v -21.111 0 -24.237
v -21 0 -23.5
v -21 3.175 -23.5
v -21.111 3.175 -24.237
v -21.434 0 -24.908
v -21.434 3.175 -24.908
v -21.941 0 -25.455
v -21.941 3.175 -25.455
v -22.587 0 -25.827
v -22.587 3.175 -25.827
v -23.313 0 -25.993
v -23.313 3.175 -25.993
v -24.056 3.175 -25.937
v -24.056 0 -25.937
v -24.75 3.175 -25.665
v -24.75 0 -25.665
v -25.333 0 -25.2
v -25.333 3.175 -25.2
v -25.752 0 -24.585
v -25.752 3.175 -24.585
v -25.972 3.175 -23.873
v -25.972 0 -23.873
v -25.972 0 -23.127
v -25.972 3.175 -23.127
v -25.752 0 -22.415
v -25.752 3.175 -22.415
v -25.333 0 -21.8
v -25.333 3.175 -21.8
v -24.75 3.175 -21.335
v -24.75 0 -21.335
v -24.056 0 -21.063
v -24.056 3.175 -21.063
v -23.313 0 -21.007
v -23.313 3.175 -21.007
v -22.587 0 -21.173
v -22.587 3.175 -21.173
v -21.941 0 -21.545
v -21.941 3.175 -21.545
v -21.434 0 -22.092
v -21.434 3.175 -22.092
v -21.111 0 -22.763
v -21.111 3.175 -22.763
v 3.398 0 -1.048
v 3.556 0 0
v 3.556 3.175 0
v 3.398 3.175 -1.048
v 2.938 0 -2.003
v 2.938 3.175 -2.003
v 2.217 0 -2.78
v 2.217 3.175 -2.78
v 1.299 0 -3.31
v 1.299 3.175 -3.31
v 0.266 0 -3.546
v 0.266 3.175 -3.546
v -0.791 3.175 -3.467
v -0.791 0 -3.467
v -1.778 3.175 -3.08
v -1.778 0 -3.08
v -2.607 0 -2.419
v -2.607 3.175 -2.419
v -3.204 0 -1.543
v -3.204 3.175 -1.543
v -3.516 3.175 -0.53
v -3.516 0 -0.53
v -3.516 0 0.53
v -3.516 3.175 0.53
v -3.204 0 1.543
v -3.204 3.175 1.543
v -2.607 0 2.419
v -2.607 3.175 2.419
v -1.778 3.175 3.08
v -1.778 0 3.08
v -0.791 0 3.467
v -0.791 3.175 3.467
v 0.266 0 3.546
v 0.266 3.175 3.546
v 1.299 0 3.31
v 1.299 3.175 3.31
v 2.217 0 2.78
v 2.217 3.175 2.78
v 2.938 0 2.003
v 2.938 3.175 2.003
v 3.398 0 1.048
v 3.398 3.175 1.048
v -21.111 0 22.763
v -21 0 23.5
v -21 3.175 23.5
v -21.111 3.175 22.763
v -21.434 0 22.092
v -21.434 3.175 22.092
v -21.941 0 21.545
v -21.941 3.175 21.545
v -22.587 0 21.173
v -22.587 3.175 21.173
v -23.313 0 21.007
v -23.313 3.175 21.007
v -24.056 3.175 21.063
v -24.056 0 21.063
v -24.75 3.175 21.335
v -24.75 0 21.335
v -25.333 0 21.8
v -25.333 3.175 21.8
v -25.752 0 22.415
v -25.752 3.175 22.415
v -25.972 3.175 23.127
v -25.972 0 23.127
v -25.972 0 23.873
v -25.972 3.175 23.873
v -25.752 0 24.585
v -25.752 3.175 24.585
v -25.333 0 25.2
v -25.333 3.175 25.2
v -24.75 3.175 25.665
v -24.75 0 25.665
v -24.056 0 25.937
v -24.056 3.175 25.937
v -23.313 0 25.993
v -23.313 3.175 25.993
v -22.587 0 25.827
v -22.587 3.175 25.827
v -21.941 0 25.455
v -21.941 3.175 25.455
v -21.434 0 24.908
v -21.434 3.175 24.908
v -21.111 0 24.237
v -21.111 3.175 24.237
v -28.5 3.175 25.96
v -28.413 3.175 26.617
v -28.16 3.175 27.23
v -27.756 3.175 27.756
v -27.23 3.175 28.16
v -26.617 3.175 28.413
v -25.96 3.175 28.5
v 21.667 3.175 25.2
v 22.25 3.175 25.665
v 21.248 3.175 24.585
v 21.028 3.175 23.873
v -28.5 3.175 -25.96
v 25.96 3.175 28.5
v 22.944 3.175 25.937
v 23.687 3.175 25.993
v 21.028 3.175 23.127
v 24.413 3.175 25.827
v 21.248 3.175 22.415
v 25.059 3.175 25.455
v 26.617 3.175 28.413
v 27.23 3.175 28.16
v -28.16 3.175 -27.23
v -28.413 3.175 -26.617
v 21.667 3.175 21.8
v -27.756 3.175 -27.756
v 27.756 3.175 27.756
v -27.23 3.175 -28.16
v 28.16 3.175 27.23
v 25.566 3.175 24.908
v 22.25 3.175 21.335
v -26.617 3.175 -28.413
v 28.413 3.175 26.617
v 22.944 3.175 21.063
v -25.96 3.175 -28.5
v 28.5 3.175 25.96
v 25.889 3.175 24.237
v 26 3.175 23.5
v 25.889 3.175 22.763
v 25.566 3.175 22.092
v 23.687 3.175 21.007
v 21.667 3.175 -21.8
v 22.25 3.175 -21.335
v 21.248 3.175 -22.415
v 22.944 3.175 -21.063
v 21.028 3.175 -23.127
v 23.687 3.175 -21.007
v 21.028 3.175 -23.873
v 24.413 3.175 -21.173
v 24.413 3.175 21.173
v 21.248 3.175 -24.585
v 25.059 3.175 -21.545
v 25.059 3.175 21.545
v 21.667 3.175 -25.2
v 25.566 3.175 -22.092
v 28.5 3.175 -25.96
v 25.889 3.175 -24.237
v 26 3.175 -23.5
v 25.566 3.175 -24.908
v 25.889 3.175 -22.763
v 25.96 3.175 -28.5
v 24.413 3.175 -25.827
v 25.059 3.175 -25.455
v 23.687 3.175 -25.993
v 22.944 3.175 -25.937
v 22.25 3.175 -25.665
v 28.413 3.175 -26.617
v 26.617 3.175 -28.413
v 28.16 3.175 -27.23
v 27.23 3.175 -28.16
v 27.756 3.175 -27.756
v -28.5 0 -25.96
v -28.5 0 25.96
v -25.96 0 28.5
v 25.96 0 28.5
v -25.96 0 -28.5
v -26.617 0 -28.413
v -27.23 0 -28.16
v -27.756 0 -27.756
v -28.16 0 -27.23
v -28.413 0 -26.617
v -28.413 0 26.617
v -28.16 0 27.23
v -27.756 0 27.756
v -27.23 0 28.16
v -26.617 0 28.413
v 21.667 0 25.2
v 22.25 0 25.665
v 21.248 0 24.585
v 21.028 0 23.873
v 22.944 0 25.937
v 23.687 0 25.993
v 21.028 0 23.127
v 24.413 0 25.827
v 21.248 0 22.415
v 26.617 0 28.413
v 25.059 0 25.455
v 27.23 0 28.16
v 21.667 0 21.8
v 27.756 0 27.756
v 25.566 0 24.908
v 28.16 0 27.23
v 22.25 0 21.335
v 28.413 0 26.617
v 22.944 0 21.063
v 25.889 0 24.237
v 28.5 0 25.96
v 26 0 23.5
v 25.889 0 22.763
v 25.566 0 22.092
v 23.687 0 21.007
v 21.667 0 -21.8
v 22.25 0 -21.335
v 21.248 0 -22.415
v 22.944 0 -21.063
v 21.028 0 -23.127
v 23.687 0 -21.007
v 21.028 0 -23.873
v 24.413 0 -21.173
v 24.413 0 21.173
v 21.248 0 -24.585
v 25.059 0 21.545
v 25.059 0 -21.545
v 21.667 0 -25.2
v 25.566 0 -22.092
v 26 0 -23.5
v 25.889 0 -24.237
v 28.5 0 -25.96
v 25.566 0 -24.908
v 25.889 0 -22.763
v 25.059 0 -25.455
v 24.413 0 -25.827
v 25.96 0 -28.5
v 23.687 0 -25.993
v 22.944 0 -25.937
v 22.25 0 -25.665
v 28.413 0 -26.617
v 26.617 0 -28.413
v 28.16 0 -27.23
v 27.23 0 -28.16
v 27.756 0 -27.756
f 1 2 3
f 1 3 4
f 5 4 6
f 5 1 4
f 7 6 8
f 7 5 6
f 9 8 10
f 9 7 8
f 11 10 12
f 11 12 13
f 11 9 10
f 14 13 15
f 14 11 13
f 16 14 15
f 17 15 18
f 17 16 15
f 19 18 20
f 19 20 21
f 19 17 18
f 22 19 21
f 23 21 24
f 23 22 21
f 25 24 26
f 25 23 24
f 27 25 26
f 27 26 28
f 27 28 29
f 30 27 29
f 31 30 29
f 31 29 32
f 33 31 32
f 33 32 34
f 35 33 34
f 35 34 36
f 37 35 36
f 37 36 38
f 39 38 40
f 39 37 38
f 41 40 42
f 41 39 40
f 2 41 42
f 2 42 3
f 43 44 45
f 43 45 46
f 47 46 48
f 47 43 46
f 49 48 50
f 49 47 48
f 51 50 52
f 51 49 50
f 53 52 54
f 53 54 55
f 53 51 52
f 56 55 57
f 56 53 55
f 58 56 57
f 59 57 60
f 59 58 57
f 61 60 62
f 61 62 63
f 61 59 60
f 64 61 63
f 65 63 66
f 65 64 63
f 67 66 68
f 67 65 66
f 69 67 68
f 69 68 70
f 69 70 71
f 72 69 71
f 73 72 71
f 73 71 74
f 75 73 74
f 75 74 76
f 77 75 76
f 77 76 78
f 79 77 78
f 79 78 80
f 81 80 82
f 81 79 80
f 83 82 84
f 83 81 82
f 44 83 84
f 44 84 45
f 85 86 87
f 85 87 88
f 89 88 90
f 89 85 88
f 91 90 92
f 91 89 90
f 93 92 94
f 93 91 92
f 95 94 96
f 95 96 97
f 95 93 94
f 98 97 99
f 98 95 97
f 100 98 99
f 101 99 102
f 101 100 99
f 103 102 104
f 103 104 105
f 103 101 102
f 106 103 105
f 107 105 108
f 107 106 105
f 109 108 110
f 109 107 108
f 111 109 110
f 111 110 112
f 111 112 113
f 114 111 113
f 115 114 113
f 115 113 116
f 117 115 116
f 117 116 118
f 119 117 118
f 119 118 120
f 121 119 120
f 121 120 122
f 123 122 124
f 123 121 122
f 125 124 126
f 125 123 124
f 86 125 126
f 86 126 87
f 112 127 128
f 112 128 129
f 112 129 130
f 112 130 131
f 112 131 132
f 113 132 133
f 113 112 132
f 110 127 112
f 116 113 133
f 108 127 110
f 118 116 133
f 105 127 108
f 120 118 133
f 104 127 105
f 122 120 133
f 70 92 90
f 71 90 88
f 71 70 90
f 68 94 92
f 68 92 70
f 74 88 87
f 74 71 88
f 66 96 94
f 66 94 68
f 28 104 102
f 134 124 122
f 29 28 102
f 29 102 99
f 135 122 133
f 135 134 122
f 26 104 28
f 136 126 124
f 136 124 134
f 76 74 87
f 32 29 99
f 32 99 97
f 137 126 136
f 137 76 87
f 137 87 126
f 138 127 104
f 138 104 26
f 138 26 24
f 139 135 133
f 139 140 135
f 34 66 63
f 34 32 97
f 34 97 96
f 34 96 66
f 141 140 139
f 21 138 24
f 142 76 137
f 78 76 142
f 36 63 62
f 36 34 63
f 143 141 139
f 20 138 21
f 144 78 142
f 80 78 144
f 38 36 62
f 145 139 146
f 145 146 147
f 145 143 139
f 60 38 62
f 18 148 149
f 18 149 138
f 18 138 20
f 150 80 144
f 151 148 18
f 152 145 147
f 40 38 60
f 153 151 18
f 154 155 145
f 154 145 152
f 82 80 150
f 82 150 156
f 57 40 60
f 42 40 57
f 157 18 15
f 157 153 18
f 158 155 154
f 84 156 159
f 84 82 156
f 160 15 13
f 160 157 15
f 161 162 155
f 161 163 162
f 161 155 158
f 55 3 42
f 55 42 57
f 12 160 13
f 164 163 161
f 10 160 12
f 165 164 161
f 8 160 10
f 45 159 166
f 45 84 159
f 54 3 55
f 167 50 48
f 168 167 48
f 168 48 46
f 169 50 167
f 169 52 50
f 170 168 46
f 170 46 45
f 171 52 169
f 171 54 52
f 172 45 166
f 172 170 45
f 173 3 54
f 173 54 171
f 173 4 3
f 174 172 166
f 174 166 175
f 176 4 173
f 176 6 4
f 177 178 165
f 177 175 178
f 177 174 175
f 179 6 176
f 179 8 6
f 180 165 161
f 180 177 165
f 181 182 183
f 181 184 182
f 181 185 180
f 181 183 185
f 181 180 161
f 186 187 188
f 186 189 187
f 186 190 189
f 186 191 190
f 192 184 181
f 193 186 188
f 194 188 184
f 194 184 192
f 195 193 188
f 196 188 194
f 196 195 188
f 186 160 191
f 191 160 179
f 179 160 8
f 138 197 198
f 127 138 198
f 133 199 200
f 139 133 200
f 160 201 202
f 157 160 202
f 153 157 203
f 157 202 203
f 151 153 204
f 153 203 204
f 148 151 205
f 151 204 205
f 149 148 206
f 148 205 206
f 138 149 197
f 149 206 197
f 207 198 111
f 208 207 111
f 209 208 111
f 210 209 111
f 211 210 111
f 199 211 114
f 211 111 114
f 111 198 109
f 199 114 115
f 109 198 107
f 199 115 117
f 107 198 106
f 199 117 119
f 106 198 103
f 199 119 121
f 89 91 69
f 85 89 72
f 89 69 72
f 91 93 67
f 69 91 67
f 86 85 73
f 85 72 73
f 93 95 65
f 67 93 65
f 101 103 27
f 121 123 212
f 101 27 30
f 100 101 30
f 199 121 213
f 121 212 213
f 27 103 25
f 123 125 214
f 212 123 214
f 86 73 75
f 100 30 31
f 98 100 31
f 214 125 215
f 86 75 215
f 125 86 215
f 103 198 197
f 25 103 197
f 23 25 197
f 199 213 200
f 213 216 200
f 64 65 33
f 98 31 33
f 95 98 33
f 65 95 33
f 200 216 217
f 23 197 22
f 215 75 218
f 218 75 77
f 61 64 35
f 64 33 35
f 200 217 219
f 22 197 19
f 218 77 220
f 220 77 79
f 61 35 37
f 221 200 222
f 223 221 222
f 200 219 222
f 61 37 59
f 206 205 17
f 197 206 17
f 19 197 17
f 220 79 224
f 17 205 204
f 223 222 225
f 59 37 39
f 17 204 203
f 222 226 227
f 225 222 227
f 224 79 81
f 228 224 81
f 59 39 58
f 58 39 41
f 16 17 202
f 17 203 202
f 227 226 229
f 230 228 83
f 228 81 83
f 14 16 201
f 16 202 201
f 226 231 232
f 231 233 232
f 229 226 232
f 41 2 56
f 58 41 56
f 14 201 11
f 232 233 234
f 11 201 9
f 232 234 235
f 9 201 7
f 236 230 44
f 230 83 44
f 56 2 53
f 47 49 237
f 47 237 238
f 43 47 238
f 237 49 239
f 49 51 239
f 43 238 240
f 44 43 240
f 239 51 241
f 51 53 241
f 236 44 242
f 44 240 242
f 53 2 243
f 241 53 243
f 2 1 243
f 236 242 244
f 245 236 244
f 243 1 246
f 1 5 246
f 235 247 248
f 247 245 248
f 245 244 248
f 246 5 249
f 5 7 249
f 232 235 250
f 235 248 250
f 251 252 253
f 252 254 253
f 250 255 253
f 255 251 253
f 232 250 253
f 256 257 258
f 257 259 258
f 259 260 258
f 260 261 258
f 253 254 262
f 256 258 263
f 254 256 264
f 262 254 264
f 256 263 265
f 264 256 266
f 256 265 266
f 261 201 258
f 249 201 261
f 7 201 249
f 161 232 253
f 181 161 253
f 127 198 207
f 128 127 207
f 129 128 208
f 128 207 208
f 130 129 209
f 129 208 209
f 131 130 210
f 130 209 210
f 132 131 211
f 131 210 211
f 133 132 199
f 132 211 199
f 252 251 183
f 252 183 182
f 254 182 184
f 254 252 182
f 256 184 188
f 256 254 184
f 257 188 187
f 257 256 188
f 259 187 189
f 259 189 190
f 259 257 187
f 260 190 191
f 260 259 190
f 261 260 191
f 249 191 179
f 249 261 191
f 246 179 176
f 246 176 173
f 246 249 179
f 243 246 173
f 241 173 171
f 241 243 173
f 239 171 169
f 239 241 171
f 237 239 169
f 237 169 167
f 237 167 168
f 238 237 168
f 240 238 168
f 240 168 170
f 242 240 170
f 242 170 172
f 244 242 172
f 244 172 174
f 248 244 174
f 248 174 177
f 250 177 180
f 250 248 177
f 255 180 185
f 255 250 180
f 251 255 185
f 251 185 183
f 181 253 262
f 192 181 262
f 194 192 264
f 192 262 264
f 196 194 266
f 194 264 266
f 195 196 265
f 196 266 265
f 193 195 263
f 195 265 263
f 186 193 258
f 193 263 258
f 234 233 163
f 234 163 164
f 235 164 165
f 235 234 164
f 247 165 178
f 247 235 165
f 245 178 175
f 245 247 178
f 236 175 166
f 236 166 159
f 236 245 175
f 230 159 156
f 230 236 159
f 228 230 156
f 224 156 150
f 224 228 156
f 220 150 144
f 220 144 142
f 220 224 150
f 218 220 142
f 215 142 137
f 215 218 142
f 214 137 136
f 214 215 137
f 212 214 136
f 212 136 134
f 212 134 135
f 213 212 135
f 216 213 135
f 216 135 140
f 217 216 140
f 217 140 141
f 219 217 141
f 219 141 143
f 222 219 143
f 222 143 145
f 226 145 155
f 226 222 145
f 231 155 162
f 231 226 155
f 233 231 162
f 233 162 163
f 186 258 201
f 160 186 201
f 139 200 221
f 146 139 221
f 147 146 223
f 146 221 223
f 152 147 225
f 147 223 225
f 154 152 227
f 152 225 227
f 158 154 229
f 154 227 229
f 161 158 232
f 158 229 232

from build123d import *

# Parameters (mm, degrees)
SKETCH1_R           = 3.556
SKETCH1_R_2         = 2.499995
BOSS_EXTRUDE1_DEPTH = 3.175


with BuildPart() as part:
    # Sketch1 → Boss-Extrude1 (new body)
    with BuildSketch(Plane(origin=(0, 0, 0), x_dir=(1, 0, 0), z_dir=(0, 1, 0))):
        with BuildLine():
            Line((-13.993314597, 28.4999938), (-25.9599938, 28.4999938))
            ThreePointArc((-25.9599938, 28.4999938), (-27.756045024, 27.756045024), (-28.4999938, 25.9599938))
            Line((-28.4999938, 25.9599938), (-28.4999938, 13.993314597))
            Line((-28.4999938, 13.993314597), (-28.4999938, -13.993314597))
            Line((-28.4999938, -13.993314597), (-28.4999938, -25.9599938))
            ThreePointArc((-28.4999938, -25.9599938), (-27.756045024, -27.756045024), (-25.9599938, -28.4999938))
            Line((-25.9599938, -28.4999938), (-13.993314597, -28.4999938))
            Line((-13.993314597, -28.4999938), (13.993314597, -28.4999938))
            Line((13.993314597, -28.4999938), (25.9599938, -28.4999938))
            ThreePointArc((25.9599938, -28.4999938), (27.756045024, -27.756045024), (28.4999938, -25.9599938))
            Line((28.4999938, -25.9599938), (28.4999938, -13.993314597))
            Line((28.4999938, -13.993314597), (28.4999938, 13.993314597))
            Line((28.4999938, 13.993314597), (28.4999938, 25.9599938))
            ThreePointArc((28.4999938, 25.9599938), (27.756045024, 27.756045024), (25.9599938, 28.4999938))
            Line((25.9599938, 28.4999938), (13.993314597, 28.4999938))
            Line((13.993314597, 28.4999938), (-13.993314597, 28.4999938))
        make_face()
        Circle(SKETCH1_R, mode=Mode.SUBTRACT)
        with Locations((-23.5000038, 23.5000038)):
            Circle(SKETCH1_R_2, mode=Mode.SUBTRACT)
        with Locations((23.5000038, 23.5000038)):
            Circle(SKETCH1_R_2, mode=Mode.SUBTRACT)
        with Locations((23.5000038, -23.5000038)):
            Circle(SKETCH1_R_2, mode=Mode.SUBTRACT)
        with Locations((-23.5000038, -23.5000038)):
            Circle(SKETCH1_R_2, mode=Mode.SUBTRACT)
    extrude(amount=BOSS_EXTRUDE1_DEPTH)


solid = part.part
